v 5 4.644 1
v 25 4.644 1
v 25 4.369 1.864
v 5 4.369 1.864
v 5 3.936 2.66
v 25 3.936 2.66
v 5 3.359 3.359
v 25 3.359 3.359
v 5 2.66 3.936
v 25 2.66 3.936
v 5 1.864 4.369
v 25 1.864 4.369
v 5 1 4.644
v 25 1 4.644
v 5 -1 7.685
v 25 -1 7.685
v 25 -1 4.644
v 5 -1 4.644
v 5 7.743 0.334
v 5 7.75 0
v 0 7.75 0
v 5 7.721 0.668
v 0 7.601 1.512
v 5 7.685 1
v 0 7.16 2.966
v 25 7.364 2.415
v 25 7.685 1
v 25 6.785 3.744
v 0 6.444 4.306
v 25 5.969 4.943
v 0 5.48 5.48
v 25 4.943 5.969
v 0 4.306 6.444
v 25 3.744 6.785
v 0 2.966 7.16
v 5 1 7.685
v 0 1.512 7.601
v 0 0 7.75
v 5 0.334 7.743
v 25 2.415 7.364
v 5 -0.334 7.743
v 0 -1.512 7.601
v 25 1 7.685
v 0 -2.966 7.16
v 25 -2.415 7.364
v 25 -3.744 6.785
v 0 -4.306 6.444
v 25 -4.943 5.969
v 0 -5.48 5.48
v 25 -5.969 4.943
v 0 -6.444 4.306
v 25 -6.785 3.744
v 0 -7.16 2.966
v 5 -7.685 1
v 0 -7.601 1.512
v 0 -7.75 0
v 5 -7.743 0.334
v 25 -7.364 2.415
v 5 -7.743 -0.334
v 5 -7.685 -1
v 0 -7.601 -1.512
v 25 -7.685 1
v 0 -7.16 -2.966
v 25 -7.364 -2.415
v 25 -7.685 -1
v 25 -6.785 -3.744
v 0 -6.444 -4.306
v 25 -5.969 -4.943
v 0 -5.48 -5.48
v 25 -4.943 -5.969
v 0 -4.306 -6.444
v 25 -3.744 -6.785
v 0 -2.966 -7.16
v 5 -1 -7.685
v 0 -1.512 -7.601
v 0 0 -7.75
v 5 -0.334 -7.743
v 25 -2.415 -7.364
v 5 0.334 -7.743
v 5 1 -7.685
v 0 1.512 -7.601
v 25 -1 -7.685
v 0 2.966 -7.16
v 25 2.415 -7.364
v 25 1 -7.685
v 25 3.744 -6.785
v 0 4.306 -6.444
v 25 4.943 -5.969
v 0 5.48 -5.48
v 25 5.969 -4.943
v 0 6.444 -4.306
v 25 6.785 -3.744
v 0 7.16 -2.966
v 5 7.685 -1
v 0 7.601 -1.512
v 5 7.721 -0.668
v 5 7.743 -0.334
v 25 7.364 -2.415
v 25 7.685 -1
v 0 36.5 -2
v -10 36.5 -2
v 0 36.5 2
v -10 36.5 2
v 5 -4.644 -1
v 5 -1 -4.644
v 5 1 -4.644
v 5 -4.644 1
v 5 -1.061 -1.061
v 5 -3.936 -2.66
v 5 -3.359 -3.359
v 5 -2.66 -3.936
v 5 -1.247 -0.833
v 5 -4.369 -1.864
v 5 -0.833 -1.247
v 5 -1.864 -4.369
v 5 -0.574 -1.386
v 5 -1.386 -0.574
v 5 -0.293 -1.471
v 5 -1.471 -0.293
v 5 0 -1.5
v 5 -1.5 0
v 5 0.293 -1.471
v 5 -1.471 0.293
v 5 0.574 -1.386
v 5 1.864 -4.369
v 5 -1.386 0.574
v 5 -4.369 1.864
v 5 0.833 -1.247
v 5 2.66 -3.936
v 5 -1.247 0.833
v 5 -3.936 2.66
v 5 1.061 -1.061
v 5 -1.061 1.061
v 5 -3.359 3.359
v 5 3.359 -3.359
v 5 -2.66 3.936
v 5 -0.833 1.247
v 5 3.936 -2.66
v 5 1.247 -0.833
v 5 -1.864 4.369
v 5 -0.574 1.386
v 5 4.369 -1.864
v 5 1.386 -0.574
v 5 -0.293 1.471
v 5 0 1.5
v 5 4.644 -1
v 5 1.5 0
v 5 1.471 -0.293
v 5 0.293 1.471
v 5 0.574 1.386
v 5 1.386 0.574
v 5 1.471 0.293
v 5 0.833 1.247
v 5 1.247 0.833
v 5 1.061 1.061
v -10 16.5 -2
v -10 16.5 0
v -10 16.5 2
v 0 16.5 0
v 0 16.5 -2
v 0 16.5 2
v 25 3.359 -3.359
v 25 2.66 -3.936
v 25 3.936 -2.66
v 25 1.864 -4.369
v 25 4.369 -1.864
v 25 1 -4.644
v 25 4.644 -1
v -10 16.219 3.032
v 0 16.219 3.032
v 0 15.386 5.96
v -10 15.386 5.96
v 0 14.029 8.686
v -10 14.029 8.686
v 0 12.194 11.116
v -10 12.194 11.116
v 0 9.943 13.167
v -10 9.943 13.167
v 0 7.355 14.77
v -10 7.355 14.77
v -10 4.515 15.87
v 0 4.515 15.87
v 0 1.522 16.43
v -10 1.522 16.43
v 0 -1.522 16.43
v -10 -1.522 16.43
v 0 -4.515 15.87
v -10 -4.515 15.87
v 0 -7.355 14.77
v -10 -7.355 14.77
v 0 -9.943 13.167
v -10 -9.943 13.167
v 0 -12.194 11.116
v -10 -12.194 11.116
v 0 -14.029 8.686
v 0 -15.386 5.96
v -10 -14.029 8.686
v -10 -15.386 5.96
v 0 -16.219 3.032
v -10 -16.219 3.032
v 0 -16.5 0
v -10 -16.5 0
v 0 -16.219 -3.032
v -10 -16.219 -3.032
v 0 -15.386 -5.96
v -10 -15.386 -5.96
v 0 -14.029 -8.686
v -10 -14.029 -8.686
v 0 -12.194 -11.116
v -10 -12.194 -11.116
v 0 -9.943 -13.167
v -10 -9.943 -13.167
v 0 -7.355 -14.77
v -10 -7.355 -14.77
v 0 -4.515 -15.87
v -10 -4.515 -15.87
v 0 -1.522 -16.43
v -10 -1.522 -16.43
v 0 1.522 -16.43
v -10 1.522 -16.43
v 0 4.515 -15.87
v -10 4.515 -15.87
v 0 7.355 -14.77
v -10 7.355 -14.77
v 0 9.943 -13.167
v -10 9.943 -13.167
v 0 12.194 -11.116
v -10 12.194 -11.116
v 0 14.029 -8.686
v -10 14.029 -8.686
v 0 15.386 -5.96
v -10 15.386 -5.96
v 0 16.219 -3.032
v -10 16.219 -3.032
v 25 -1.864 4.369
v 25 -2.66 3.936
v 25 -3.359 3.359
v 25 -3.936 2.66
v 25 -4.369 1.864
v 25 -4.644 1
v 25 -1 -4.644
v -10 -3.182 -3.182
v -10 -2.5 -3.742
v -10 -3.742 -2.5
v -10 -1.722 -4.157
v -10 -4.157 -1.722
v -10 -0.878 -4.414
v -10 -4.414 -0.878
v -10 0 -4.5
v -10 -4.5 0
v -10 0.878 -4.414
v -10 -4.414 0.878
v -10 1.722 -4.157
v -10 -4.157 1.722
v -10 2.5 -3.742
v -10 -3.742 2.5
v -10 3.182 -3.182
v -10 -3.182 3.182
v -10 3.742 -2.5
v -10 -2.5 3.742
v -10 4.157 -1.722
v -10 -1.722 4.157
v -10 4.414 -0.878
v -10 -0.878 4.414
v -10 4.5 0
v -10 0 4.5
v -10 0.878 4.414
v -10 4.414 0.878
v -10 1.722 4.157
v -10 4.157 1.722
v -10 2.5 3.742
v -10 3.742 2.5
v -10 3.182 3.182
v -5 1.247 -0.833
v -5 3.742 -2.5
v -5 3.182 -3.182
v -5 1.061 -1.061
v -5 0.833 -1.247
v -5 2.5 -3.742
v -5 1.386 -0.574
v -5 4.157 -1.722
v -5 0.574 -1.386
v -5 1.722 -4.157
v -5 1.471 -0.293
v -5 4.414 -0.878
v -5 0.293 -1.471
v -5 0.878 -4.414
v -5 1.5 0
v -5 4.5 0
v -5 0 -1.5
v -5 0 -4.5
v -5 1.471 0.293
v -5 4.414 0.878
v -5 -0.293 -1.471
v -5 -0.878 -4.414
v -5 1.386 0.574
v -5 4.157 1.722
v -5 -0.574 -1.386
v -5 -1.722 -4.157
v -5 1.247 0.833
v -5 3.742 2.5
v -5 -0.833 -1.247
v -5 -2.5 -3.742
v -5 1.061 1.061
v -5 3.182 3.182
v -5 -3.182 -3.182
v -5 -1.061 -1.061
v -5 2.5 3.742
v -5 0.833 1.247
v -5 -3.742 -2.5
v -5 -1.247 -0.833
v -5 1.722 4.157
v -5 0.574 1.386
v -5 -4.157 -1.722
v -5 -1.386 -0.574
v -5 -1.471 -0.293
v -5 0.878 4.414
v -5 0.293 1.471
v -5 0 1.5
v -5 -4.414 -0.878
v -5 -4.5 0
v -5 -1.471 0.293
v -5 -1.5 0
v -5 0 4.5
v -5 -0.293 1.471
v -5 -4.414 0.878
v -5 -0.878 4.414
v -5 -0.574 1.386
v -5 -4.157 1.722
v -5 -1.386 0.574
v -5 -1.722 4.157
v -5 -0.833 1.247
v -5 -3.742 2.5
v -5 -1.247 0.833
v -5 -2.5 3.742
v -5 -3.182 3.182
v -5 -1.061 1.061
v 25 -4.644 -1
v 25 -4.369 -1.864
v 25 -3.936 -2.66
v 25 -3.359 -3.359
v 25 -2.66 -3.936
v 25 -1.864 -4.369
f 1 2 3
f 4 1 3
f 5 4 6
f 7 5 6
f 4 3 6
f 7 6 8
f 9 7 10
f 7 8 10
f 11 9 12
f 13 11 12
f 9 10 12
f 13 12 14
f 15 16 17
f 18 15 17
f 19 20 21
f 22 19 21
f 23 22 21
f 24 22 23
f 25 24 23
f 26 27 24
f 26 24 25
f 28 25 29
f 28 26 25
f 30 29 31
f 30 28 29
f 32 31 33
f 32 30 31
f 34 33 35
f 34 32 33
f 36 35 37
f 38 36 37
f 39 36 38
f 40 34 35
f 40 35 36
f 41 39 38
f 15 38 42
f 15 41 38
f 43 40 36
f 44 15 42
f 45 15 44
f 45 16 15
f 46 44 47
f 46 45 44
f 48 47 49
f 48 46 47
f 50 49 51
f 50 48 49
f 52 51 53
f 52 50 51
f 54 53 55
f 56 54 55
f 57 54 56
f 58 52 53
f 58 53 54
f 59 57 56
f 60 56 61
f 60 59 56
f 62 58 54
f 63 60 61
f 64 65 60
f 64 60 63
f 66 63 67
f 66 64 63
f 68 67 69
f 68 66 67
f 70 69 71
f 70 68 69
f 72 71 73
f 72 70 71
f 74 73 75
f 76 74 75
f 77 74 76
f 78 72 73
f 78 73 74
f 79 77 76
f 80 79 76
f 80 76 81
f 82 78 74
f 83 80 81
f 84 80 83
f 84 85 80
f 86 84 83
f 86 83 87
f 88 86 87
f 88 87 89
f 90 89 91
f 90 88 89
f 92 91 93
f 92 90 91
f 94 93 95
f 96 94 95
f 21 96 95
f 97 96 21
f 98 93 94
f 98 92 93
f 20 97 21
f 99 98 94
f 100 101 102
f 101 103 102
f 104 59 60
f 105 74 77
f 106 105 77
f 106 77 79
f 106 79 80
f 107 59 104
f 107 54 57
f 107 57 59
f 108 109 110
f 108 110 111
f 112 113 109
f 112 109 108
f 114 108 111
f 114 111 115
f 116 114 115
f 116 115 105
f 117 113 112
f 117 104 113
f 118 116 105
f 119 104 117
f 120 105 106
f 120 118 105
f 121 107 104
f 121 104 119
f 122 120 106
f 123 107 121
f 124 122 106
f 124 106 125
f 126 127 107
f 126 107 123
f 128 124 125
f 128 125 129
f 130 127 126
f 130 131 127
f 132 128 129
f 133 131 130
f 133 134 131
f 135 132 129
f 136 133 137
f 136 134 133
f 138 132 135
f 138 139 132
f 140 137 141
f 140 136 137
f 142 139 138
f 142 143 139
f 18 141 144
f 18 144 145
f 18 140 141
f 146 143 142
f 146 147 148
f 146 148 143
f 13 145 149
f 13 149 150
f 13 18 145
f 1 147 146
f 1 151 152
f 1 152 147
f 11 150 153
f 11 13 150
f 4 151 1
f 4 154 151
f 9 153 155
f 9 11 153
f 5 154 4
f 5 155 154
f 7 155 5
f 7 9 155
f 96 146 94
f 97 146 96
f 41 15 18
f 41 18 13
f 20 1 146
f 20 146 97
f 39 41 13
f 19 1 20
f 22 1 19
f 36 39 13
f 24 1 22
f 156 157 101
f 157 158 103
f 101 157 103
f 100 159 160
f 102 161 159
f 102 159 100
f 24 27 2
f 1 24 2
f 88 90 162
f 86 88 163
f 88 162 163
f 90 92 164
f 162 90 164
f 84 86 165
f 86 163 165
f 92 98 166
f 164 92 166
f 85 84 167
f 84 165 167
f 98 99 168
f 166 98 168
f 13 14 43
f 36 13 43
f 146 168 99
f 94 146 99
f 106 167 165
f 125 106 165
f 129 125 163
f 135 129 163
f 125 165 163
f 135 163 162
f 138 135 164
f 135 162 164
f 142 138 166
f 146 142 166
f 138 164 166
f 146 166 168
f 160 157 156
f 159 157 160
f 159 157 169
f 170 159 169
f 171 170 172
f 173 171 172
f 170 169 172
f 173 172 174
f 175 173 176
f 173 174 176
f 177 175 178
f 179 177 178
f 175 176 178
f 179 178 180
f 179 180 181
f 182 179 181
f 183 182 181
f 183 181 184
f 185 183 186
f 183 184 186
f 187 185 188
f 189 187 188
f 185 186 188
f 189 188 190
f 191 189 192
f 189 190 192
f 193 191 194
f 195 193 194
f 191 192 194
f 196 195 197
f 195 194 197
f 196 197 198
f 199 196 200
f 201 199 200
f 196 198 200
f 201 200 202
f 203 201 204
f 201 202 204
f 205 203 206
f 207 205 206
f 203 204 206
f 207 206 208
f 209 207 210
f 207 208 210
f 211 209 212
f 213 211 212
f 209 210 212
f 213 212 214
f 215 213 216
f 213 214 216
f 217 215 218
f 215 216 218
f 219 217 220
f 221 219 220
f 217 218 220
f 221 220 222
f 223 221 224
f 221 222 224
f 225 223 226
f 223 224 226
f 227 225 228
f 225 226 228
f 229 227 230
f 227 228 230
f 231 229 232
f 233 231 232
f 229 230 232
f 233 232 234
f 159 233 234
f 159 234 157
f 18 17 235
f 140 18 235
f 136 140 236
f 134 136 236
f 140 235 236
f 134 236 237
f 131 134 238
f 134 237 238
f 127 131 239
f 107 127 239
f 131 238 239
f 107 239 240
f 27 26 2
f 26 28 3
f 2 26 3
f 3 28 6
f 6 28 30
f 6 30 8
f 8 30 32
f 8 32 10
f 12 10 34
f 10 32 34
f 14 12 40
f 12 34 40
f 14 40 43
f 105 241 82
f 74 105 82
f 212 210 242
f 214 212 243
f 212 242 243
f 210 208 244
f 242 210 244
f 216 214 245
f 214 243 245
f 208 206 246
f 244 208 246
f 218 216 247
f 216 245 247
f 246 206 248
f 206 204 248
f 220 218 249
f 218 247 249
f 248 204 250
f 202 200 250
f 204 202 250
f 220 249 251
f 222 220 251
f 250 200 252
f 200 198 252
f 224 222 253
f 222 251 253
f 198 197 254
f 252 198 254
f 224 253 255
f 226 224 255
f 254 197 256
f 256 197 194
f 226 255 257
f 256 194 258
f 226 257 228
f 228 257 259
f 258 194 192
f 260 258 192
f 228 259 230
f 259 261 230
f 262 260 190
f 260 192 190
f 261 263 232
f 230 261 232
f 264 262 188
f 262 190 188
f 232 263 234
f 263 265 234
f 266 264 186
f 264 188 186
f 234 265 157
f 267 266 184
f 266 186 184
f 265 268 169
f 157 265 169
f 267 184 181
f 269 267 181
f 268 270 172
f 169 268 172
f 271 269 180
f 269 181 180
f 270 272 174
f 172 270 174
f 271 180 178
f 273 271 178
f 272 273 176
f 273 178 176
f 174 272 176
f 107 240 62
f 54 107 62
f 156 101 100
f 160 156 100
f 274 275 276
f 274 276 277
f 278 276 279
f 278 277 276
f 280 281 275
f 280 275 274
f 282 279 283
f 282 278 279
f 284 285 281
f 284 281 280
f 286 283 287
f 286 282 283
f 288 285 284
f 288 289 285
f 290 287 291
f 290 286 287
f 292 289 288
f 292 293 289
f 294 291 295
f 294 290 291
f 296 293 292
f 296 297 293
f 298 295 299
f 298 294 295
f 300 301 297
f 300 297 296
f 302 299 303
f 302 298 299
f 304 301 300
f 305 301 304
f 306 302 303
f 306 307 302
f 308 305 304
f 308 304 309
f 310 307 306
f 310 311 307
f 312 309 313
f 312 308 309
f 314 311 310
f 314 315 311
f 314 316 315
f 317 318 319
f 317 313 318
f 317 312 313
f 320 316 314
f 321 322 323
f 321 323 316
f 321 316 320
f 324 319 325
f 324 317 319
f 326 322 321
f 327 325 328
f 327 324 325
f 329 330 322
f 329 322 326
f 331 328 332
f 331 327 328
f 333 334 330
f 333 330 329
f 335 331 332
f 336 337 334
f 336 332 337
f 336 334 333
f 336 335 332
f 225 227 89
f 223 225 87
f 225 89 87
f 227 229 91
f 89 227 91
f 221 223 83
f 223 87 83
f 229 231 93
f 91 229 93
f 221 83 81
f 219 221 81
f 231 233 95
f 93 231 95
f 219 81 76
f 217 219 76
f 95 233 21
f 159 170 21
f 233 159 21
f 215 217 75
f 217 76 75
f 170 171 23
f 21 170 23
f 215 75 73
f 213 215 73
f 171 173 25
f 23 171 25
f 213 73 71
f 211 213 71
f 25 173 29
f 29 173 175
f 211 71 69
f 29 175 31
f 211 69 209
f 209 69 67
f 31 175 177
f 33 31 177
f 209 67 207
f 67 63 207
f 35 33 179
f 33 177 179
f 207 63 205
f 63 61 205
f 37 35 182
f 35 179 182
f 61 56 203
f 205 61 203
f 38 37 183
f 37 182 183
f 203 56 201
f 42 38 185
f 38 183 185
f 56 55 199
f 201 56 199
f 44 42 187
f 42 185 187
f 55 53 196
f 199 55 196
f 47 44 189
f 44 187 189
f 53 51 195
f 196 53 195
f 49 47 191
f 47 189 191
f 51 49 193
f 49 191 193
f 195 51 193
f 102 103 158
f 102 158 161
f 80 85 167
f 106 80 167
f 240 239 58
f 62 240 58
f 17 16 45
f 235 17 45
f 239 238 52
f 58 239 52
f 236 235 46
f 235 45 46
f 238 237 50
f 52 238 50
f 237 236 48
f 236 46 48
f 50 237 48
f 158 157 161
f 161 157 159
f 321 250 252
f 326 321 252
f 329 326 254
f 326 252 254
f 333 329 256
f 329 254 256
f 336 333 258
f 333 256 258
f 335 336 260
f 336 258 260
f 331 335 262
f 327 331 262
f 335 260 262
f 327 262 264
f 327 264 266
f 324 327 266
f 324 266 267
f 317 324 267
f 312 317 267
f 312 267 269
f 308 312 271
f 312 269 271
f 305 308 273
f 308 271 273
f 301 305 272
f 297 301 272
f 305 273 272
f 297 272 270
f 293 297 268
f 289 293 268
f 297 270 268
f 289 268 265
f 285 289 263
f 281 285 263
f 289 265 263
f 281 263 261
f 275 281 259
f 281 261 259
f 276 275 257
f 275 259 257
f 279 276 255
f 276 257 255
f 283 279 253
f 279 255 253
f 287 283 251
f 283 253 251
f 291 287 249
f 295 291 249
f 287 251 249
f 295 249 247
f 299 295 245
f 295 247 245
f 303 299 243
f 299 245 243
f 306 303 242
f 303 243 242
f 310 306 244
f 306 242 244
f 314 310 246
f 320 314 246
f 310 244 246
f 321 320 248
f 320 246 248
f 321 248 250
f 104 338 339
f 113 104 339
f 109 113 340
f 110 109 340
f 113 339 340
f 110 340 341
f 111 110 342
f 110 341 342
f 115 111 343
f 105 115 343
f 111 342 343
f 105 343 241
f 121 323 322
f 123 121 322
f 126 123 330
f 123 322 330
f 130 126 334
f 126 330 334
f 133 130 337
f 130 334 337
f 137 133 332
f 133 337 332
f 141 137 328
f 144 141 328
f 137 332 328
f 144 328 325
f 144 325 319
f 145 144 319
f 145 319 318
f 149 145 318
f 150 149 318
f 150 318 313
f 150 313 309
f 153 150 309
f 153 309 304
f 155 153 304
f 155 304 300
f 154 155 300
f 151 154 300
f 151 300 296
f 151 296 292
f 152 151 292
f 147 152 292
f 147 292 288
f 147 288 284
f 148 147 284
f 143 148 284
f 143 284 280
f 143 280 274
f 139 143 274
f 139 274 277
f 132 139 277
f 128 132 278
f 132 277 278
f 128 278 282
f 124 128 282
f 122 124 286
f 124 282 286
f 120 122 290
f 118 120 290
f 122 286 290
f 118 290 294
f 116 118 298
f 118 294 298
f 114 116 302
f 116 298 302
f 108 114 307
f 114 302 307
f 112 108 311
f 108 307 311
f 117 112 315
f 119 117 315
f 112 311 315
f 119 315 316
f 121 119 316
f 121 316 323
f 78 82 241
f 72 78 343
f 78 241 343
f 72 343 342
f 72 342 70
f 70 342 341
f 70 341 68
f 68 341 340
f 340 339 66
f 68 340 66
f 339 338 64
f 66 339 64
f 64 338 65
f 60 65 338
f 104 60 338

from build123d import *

# Parameters (mm, degrees)
F0_W     = 25
F0_H     = 7.75
F2_W     = 2
F2_H     = 2
F3_DEPTH = 20
F4_R     = 4.5
F4_R_2   = 1.5
F5_DEPTH = 5
F6_DEPTH = 25
F7_W     = 10
F7_H     = 20
F8_DEPTH = 2
F9_DEPTH = 2


# Not quite as in the source:
# - a feature names something its author has since deleted; it is built from what else it names


with BuildPart() as f1:
    # F0 (on Top) → F1 (revolve)
    with BuildSketch(Plane.XY):
        Polygon((-10, 0), (0, 0), (0, 7.75), (0, 16.5), (-10, 16.5), align=None)
        with Locations((12.5, 3.875)):
            Rectangle(F0_W, F0_H)
    revolve(axis=Axis((12.5, 0, 0), (1, 0, 0)))

    # F2 (on face) → F3 (cut)
    with BuildSketch(Plane.YZ.offset(25)):
        with BuildLine():
            ThreePointArc((4.6435439053, 1), (4.7233109971, 0.502825243), (4.75, 0))
            ThreePointArc((4.75, 0), (4.7233109971, -0.502825243), (4.6435439053, -1))
            Line((4.6435439053, -1), (7.6852130745, -1))
            ThreePointArc((7.6852130745, -1), (7.7337863084, -0.5010482376), (7.75, 0))
            ThreePointArc((7.75, 0), (7.7337863084, 0.5010482376), (7.6852130745, 1))
            Line((7.6852130745, 1), (4.6435439053, 1))
        make_face()
        with BuildLine():
            Line((10.7483885819, 1), (7.6852130745, 1))
            ThreePointArc((7.6852130745, 1), (7.7337863084, 0.5010482376), (7.75, 0))
            ThreePointArc((7.75, 0), (7.7337863084, -0.5010482376), (7.6852130745, -1))
            Line((7.6852130745, -1), (10.7483885819, -1))
            Line((10.7483885819, -1), (10.7483885819, 1))
        make_face()
        with BuildLine():
            ThreePointArc((4.6435439053, -1), (4.7233109971, -0.502825243), (4.75, 0))
            ThreePointArc((4.75, 0), (4.7233109971, 0.502825243), (4.6435439053, 1))
            Line((4.6435439053, 1), (1, 1))
            Line((1, 1), (1, -1))
            Line((1, -1), (4.6435439053, -1))
        make_face()
        with BuildLine():
            Line((1, 1), (1, 4.6435439053))
            ThreePointArc((1, 4.6435439053), (0, 4.75), (-1, 4.6435439053))
            Line((-1, 4.6435439053), (-1, 1))
            Line((-1, 1), (1, 1))
        make_face()
        with BuildLine():
            ThreePointArc((-1, 4.6435439053), (0, 4.75), (1, 4.6435439053))
            Line((1, 4.6435439053), (1, 7.6852130745))
            ThreePointArc((1, 7.6852130745), (0, 7.75), (-1, 7.6852130745))
            Line((-1, 7.6852130745), (-1, 4.6435439053))
        make_face()
        with BuildLine():
            ThreePointArc((-1, 7.6852130745), (0, 7.75), (1, 7.6852130745))
            Line((1, 7.6852130745), (1, 10.1087059955))
            Line((1, 10.1087059955), (-1, 10.1087059955))
            Line((-1, 10.1087059955), (-1, 7.6852130745))
        make_face()
        Rectangle(F2_W, F2_H)
        with BuildLine():
            ThreePointArc((-1, -4.6435439053), (0, -4.75), (1, -4.6435439053))
            Line((1, -4.6435439053), (1, -1))
            Line((1, -1), (-1, -1))
            Line((-1, -1), (-1, -4.6435439053))
        make_face()
        with BuildLine():
            Line((1, -7.6852130745), (1, -4.6435439053))
            ThreePointArc((1, -4.6435439053), (0, -4.75), (-1, -4.6435439053))
            Line((-1, -4.6435439053), (-1, -7.6852130745))
            ThreePointArc((-1, -7.6852130745), (0, -7.75), (1, -7.6852130745))
        make_face()
        with BuildLine():
            Line((1, -10.1087059955), (1, -7.6852130745))
            ThreePointArc((1, -7.6852130745), (0, -7.75), (-1, -7.6852130745))
            Line((-1, -7.6852130745), (-1, -10.1087059955))
            Line((-1, -10.1087059955), (1, -10.1087059955))
        make_face()
        with BuildLine():
            Line((-1, -1), (-1, 1))
            Line((-1, 1), (-4.6435439053, 1))
            ThreePointArc((-4.6435439053, 1), (-4.75, 0), (-4.6435439053, -1))
            Line((-4.6435439053, -1), (-1, -1))
        make_face()
        with BuildLine():
            ThreePointArc((-4.6435439053, -1), (-4.75, 0), (-4.6435439053, 1))
            Line((-4.6435439053, 1), (-7.6852130745, 1))
            ThreePointArc((-7.6852130745, 1), (-7.75, 0), (-7.6852130745, -1))
            Line((-7.6852130745, -1), (-4.6435439053, -1))
        make_face()
        with BuildLine():
            ThreePointArc((-7.6852130745, -1), (-7.75, 0), (-7.6852130745, 1))
            Line((-7.6852130745, 1), (-10.7483885819, 1))
            Line((-10.7483885819, 1), (-10.7483885819, -1))
            Line((-10.7483885819, -1), (-7.6852130745, -1))
        make_face()
        with BuildLine():
            Line((-1, 1), (-1, 4.6435439053))
            ThreePointArc((-1, 4.6435439053), (-3.3587572106, 3.3587572106), (-4.6435439053, 1))
            Line((-4.6435439053, 1), (-1, 1))
        make_face()
        with BuildLine():
            ThreePointArc((-4.6435439053, -1), (-3.3587572106, -3.3587572106), (-1, -4.6435439053))
            Line((-1, -4.6435439053), (-1, -1))
            Line((-1, -1), (-4.6435439053, -1))
        make_face()
        with BuildLine():
            ThreePointArc((1, -4.6435439053), (3.3587572106, -3.3587572106), (4.6435439053, -1))
            Line((4.6435439053, -1), (1, -1))
            Line((1, -1), (1, -4.6435439053))
        make_face()
        with BuildLine():
            Line((1, 1), (4.6435439053, 1))
            ThreePointArc((4.6435439053, 1), (3.3587572106, 3.3587572106), (1, 4.6435439053))
            Line((1, 4.6435439053), (1, 1))
        make_face()
    extrude(amount=-F3_DEPTH, mode=Mode.SUBTRACT)

    # F4 (on face) → F5 (cut)
    with BuildSketch(Plane(origin=(-10, 0, 0), x_dir=(0, -1, 0), z_dir=(-1, 0, 0))):
        Circle(F4_R)
        Circle(F4_R_2, mode=Mode.SUBTRACT)
    extrude(amount=-F5_DEPTH, mode=Mode.SUBTRACT)

    # F6 (cut): a face of the model
    f6_faces = [f1.faces().sort_by_distance(p)[0] for p in [
        (-10, 0, 0),
    ]]
    extrude(f6_faces, amount=-F6_DEPTH, mode=Mode.SUBTRACT)

    # F7 (on Top) → F8 (join)
    with BuildSketch(Plane.XY):
        with Locations((-5, 26.5)):
            Rectangle(F7_W, F7_H)
    extrude(amount=F8_DEPTH)

    # F7 (on Top) → F9 (join)
    with BuildSketch(Plane.XY):
        with Locations((-5, 26.5)):
            Rectangle(F7_W, F7_H)
    extrude(amount=-F9_DEPTH)


solid = f1.part
